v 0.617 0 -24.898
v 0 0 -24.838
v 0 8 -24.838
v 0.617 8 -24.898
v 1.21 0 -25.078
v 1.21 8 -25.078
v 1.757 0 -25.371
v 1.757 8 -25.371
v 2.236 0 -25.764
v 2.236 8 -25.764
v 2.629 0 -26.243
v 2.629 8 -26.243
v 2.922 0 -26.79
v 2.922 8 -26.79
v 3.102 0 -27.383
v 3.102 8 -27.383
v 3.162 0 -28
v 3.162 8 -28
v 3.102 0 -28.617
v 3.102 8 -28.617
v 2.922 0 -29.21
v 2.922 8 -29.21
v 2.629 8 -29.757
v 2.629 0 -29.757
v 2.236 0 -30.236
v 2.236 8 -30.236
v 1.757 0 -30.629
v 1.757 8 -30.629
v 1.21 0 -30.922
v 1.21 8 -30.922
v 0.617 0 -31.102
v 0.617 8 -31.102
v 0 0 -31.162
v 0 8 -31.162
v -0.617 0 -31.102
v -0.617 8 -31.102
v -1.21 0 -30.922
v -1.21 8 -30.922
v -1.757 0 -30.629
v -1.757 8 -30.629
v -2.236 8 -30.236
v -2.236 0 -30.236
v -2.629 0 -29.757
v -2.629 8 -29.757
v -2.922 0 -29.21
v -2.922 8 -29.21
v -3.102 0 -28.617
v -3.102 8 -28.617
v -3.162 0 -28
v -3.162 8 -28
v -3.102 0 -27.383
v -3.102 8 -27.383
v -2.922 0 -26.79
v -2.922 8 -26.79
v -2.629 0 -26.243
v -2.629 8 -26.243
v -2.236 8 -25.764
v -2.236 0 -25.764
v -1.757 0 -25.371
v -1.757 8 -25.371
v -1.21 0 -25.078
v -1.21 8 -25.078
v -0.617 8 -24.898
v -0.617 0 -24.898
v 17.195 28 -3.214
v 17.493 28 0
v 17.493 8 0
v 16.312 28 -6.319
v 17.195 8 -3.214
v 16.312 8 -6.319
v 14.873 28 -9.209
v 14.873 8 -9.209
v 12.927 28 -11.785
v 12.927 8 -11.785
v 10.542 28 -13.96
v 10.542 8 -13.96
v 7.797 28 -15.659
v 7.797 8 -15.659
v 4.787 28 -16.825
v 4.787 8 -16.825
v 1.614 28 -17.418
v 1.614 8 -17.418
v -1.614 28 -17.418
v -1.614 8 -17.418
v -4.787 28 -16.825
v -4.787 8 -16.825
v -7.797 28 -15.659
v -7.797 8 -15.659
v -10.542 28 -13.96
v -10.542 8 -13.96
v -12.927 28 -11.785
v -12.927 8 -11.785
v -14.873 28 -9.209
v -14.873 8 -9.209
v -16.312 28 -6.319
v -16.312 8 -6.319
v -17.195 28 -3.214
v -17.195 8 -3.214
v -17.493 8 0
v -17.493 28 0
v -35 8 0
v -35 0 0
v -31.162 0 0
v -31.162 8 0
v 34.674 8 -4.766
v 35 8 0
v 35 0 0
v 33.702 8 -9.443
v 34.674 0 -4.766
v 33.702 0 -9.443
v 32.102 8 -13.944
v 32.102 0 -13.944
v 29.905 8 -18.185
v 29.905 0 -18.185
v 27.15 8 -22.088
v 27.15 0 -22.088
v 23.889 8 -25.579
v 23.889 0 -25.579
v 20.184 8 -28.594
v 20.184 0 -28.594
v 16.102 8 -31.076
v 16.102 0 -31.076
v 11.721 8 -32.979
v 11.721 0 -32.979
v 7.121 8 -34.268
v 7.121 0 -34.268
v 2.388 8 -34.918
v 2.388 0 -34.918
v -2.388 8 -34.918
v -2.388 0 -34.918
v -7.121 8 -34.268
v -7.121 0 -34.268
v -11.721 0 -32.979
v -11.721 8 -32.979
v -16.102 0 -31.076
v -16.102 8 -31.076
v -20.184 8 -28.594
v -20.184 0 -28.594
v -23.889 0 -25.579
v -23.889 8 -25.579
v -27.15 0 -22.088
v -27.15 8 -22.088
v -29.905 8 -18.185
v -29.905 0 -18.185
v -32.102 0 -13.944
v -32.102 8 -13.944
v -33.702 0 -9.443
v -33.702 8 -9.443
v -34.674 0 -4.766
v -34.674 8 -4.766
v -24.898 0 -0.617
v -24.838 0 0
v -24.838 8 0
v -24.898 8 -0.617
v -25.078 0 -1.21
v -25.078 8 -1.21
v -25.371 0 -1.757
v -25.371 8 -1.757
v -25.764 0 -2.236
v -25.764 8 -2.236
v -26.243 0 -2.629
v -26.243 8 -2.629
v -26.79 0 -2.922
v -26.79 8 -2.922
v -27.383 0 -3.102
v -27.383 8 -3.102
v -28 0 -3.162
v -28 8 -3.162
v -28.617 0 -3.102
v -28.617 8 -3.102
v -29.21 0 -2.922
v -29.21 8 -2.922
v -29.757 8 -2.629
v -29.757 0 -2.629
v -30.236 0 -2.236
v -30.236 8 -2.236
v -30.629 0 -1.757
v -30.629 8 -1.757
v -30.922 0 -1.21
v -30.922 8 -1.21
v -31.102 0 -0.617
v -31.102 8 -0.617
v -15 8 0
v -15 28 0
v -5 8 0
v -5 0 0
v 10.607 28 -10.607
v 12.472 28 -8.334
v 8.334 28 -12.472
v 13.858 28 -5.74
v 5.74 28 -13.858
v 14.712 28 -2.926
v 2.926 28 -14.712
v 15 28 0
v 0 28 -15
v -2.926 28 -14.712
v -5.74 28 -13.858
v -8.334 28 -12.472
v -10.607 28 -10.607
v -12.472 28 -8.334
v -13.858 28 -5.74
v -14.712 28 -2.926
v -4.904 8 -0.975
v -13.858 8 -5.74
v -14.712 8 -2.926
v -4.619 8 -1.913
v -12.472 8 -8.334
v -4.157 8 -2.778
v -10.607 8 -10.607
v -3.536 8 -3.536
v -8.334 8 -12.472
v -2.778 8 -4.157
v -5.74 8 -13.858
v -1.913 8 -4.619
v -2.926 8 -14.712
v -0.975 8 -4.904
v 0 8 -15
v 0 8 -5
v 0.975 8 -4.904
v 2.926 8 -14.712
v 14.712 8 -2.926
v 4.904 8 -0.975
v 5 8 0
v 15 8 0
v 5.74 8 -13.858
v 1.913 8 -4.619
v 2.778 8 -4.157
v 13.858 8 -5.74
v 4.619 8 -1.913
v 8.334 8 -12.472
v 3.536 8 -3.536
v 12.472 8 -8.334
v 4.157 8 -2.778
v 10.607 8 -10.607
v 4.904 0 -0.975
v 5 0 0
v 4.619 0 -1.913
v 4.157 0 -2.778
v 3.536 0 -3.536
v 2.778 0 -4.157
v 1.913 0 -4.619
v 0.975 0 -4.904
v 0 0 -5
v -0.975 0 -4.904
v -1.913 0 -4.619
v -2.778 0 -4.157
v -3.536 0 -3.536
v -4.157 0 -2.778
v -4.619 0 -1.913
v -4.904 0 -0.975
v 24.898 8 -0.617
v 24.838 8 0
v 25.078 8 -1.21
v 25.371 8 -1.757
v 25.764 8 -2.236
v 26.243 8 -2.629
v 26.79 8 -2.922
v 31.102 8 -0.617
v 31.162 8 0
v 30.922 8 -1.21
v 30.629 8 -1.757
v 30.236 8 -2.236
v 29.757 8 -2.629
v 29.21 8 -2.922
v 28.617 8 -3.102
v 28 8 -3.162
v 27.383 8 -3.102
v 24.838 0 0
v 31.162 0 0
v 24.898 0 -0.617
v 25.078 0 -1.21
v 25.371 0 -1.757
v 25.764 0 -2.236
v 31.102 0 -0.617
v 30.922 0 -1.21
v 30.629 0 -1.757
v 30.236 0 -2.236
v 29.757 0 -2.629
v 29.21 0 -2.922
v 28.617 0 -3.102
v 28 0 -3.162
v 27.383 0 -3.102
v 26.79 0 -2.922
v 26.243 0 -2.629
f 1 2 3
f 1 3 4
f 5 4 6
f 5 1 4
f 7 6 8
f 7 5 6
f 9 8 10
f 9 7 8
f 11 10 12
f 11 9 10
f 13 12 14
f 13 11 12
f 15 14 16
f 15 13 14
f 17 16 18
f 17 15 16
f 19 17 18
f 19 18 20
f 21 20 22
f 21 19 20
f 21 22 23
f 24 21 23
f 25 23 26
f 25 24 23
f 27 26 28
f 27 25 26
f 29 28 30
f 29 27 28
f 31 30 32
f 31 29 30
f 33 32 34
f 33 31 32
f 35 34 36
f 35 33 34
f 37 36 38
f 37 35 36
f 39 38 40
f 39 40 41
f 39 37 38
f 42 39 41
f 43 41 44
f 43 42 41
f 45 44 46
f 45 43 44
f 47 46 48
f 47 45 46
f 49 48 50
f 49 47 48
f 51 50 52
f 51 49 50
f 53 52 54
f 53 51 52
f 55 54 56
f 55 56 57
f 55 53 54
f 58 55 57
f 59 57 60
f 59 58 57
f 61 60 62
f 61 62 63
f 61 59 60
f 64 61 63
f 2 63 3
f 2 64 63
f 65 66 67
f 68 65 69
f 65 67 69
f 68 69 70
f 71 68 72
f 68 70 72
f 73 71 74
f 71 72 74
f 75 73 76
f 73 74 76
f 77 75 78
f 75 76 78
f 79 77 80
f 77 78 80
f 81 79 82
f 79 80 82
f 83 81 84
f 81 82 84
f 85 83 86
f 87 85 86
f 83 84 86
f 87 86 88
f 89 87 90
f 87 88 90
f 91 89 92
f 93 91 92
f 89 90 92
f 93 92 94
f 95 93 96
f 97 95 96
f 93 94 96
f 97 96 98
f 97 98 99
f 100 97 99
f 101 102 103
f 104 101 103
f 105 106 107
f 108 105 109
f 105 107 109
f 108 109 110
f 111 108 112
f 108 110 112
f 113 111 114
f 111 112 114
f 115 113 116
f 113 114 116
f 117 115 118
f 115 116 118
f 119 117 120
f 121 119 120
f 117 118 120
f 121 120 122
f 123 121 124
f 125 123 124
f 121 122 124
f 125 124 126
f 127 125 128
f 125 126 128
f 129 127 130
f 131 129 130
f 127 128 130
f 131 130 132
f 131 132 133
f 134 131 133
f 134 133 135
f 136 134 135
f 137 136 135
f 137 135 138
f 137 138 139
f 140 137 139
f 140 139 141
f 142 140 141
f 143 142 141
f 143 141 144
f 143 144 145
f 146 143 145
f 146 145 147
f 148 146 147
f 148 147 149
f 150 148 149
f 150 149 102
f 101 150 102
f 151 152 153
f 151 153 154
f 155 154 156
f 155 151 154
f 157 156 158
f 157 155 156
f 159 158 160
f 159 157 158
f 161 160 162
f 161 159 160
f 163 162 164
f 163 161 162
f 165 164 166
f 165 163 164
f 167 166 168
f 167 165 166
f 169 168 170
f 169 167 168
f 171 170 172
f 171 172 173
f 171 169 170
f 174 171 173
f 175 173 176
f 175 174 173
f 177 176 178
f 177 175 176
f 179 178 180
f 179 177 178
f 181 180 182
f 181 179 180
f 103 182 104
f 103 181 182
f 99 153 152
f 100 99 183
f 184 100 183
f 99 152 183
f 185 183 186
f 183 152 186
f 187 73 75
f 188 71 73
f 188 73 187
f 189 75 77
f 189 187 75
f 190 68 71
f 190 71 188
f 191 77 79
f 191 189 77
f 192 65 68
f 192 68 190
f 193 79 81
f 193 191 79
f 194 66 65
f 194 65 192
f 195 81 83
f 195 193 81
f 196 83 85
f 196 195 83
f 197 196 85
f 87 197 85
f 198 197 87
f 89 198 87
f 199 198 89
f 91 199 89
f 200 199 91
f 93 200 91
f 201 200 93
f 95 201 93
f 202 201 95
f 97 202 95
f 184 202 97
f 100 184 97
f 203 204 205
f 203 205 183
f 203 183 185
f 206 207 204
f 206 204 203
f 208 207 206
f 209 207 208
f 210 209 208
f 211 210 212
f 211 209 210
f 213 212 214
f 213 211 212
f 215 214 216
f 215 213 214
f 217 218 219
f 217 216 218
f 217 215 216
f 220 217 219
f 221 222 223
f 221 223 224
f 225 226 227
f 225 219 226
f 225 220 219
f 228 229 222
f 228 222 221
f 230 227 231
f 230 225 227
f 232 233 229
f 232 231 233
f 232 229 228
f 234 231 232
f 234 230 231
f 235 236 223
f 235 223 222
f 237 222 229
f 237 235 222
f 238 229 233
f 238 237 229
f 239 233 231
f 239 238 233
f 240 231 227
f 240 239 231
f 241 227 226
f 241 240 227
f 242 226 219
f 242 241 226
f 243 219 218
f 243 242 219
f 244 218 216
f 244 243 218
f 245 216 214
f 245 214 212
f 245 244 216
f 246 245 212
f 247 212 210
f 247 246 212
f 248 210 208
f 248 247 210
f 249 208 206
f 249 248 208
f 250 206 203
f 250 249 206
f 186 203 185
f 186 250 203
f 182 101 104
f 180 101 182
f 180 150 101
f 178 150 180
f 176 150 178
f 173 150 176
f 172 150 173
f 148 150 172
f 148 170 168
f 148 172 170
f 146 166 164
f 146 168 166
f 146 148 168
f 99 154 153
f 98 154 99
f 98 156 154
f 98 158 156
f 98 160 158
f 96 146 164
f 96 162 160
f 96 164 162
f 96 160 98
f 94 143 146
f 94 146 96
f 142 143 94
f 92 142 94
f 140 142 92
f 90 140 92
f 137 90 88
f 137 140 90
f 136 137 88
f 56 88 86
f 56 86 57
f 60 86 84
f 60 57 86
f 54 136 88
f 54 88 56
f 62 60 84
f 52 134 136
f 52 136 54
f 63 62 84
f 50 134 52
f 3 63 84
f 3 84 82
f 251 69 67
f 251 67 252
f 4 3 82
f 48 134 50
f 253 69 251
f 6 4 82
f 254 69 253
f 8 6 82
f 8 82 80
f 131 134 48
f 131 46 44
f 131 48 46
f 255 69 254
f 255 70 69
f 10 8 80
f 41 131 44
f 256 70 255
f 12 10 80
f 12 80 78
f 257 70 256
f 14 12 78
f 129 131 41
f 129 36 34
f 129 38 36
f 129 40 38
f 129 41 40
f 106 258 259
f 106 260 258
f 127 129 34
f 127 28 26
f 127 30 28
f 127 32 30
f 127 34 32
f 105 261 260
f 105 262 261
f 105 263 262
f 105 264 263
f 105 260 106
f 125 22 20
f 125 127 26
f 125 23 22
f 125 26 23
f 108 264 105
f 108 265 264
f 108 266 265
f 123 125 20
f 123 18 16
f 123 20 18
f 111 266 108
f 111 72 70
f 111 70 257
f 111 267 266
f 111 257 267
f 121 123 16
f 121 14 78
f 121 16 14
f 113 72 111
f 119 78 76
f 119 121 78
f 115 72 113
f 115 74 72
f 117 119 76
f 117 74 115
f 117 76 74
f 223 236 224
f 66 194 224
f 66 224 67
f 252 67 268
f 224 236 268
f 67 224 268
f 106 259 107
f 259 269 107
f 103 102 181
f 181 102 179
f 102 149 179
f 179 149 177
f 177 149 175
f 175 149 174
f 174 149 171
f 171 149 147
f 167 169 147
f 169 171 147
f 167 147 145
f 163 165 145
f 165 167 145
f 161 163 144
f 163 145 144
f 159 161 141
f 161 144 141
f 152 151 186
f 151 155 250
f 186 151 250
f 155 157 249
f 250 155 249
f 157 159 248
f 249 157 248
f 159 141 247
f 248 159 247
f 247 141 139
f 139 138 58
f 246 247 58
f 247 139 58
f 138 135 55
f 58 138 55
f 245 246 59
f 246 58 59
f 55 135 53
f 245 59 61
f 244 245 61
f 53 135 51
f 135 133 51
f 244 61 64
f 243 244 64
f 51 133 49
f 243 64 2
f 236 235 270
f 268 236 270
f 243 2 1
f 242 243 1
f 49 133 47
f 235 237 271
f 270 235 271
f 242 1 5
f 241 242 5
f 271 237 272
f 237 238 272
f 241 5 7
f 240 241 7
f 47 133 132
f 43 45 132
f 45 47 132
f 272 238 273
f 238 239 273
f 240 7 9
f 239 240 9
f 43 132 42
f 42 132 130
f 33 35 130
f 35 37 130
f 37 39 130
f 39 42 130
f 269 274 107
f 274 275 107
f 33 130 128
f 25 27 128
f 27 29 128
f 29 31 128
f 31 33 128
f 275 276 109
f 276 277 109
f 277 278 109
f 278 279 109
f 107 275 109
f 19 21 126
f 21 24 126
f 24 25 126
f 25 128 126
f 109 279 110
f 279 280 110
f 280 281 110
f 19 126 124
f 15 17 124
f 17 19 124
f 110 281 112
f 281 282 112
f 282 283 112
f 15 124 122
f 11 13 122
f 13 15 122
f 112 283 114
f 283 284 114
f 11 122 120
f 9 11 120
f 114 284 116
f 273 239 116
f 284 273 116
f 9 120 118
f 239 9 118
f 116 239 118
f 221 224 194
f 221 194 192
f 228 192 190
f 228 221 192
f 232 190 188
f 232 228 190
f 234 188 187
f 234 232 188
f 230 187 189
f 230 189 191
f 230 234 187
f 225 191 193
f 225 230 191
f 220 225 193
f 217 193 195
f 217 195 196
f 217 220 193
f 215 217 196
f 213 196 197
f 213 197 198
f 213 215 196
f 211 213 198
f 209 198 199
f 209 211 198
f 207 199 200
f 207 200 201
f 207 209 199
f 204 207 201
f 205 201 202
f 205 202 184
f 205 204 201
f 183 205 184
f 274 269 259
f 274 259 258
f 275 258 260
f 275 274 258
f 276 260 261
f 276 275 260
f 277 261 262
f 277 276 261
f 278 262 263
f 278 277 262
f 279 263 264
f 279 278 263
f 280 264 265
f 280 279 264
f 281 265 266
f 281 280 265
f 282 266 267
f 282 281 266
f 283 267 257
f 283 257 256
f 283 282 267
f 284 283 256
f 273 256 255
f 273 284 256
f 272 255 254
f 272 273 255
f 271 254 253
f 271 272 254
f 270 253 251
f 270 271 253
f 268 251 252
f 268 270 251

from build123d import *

# Parameters (mm, degrees)
ESQUISSE2_R             = 35
ESQUISSE2_R_2           = 5
ESQUISSE2_R_3           = 3.16227766
BASE_EXTRUSION_DEPTH    = 8
ESQUISSE3_R             = 17.492855685
ESQUISSE3_R_2           = 15
BOSS_EXTRU_1_DEPTH      = 20
ESQUISSE4_W             = 72
ESQUISSE4_H             = 33
ENL_V_MAT_EXTRU_2_DEPTH = 57.868268832


with BuildPart() as part:
    # Esquisse2 → Base-Extrusion (new body)
    with BuildSketch(Plane(origin=(0, 0, 0), x_dir=(1, 0, 0), z_dir=(0, 1, 0))):
        Circle(ESQUISSE2_R)
        Circle(ESQUISSE2_R_2, mode=Mode.SUBTRACT)
        with Locations((-28, 0)):
            Circle(ESQUISSE2_R_3, mode=Mode.SUBTRACT)
        with Locations(Location((0, 28, 0), (0, 0, 270))):
            Circle(ESQUISSE2_R_3, mode=Mode.SUBTRACT)
        with Locations((0, -28)):
            Circle(ESQUISSE2_R_3, mode=Mode.SUBTRACT)
        with Locations((28, 0)):
            Circle(ESQUISSE2_R_3, mode=Mode.SUBTRACT)
    extrude(amount=BASE_EXTRUSION_DEPTH)

    # Esquisse3 → Boss.-Extru.1 (add)
    with BuildSketch(Plane(origin=(0, 8, 0), x_dir=(-1, 0, 0), z_dir=(0, 1, 0))):
        Circle(ESQUISSE3_R)
        Circle(ESQUISSE3_R_2, mode=Mode.SUBTRACT)
    extrude(amount=BOSS_EXTRU_1_DEPTH)

    # Esquisse4 → Enlèv. mat.-Extru.2 (cut, through all)
    with BuildSketch(Plane(origin=(0, 0, 0), x_dir=(1, 0, 0), z_dir=(0, 1, 0))):
        with Locations((-1, -16.5)):
            Rectangle(ESQUISSE4_W, ESQUISSE4_H)
    extrude(amount=ENL_V_MAT_EXTRU_2_DEPTH, mode=Mode.SUBTRACT)


with BuildPart() as enl_v_mat_extru_2_kept_piece:
    # of the separate pieces the step leaves, the one the design keeps (enl_v_mat_extru_2_pieces_kept)
    add(part.part.solids().sort_by_distance((35, 0, 0))[0])


solid = enl_v_mat_extru_2_kept_piece.part
